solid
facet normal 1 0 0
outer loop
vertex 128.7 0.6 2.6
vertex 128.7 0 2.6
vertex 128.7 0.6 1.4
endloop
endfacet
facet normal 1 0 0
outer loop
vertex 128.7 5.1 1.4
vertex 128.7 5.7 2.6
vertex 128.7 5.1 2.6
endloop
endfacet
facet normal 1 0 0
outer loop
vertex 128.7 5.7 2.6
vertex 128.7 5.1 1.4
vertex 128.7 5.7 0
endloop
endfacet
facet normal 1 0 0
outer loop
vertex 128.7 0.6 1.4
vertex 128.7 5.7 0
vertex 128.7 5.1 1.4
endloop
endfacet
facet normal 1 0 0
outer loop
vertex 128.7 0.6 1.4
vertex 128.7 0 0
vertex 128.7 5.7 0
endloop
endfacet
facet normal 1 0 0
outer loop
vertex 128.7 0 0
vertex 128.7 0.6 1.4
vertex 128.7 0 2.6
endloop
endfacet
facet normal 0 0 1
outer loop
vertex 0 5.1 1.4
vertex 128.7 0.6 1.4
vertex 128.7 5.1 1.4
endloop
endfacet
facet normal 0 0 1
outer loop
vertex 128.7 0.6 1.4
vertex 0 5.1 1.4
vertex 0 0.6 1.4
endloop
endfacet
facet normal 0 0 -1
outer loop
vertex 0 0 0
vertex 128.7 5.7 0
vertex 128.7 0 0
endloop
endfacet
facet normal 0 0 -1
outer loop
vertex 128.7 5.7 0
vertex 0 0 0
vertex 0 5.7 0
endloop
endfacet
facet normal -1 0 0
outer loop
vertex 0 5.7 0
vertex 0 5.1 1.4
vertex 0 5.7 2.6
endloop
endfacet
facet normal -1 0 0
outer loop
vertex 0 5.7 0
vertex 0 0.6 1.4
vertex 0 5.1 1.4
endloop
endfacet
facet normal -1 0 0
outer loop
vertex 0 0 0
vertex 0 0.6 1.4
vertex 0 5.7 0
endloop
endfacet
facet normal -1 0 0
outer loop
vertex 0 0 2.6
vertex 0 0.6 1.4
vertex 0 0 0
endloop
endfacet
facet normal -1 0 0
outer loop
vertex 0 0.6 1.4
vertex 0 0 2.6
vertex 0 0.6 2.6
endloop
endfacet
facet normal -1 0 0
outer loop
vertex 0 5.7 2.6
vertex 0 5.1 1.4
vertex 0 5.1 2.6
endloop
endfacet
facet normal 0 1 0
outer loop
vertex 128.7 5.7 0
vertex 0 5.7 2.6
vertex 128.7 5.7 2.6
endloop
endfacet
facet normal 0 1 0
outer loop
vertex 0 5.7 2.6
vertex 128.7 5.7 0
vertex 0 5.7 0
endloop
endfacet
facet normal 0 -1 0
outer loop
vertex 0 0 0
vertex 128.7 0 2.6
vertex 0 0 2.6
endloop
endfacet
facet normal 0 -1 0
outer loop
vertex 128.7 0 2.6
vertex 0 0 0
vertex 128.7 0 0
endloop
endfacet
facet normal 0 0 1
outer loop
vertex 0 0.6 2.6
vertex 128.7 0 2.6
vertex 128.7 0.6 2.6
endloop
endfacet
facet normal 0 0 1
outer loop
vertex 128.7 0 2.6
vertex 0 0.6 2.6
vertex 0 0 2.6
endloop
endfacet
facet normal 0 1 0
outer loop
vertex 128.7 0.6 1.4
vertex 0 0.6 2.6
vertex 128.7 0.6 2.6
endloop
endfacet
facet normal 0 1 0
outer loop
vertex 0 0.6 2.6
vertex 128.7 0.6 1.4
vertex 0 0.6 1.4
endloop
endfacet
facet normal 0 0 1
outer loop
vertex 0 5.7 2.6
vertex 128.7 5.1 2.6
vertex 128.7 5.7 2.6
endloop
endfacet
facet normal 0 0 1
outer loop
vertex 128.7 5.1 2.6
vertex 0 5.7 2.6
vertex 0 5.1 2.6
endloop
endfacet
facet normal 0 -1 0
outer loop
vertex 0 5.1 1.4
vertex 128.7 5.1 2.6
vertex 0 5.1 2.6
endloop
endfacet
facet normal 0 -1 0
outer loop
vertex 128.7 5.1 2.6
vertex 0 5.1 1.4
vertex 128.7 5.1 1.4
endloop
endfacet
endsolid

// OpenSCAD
WS = 0.3;   // pixel to mm
FTH = 1.4 / WS;
TH = 1.3 / WS;   // minimum thickness
TH2 = 0.6 / WS;

l1 = 177.66;
l1connector = false;
l2 = 177.66;
l2connector = false;
w = 19;
d = 429;

h = abs(l2 - l1);
cw = 2 / WS;//max(w - 6 / WS, 4 / WS);
cl = 4 / WS;

scale([WS, WS, WS]) translate([0, 0, FTH]) {
  // body
  multmatrix([
    [1, 0, 0, 0],
    [0, 1, 0, 0],
    [(l2 - l1) / d, 0, 1, 0],
    [0, 0, 0, 1]
  ]) {
    translate([0, 0, -FTH]) cube([d, w, FTH]);
    cube([d, TH2, 4]);
    translate([0, w - TH2, 0]) cube([d, TH2, 4]);
    // if (l1connector)
    //   translate([0, 0, -(TH + 1.5/WS)]) cube([TH, w, TH + 1.5/WS]);
    // if (l2connector)
    //   translate([d - TH, 0, -(TH + 1.5/WS)]) cube([TH, w, TH + 1.5/WS]);
  }

  // connector 1
  if (l1connector) {
    #translate([-cl, (w - cw) / 2, -FTH]) cube([cl, cw, FTH]);
    translate([-4/WS, w/2, -FTH]) cylinder(r=3/2/WS, h=FTH);
  }

  // connector 2
  if (l2connector) {
    #translate([d, (w - cw) / 2, l2 - l1 - FTH]) cube([cl, cw, FTH]);
    translate([d + 4/WS, w/2, l2 - l1 - FTH]) cylinder(r=3/2/WS, h=FTH);
    // #translate([d + 4/WS, w/2, l2 - l1 - FTH-5/WS]) cylinder(r=3.2/2/WS, h=5/WS);
    // #translate([d, (w - cw) / 2, l2 - l1 - FTH]) cube([2/WS, cw, FTH]);
    // translate([-2/WS, 0, 0]) translate([d + 4/WS, w/2, l2 - l1 - FTH]) cylinder(r=3/2/WS, h=FTH);
  }
}
